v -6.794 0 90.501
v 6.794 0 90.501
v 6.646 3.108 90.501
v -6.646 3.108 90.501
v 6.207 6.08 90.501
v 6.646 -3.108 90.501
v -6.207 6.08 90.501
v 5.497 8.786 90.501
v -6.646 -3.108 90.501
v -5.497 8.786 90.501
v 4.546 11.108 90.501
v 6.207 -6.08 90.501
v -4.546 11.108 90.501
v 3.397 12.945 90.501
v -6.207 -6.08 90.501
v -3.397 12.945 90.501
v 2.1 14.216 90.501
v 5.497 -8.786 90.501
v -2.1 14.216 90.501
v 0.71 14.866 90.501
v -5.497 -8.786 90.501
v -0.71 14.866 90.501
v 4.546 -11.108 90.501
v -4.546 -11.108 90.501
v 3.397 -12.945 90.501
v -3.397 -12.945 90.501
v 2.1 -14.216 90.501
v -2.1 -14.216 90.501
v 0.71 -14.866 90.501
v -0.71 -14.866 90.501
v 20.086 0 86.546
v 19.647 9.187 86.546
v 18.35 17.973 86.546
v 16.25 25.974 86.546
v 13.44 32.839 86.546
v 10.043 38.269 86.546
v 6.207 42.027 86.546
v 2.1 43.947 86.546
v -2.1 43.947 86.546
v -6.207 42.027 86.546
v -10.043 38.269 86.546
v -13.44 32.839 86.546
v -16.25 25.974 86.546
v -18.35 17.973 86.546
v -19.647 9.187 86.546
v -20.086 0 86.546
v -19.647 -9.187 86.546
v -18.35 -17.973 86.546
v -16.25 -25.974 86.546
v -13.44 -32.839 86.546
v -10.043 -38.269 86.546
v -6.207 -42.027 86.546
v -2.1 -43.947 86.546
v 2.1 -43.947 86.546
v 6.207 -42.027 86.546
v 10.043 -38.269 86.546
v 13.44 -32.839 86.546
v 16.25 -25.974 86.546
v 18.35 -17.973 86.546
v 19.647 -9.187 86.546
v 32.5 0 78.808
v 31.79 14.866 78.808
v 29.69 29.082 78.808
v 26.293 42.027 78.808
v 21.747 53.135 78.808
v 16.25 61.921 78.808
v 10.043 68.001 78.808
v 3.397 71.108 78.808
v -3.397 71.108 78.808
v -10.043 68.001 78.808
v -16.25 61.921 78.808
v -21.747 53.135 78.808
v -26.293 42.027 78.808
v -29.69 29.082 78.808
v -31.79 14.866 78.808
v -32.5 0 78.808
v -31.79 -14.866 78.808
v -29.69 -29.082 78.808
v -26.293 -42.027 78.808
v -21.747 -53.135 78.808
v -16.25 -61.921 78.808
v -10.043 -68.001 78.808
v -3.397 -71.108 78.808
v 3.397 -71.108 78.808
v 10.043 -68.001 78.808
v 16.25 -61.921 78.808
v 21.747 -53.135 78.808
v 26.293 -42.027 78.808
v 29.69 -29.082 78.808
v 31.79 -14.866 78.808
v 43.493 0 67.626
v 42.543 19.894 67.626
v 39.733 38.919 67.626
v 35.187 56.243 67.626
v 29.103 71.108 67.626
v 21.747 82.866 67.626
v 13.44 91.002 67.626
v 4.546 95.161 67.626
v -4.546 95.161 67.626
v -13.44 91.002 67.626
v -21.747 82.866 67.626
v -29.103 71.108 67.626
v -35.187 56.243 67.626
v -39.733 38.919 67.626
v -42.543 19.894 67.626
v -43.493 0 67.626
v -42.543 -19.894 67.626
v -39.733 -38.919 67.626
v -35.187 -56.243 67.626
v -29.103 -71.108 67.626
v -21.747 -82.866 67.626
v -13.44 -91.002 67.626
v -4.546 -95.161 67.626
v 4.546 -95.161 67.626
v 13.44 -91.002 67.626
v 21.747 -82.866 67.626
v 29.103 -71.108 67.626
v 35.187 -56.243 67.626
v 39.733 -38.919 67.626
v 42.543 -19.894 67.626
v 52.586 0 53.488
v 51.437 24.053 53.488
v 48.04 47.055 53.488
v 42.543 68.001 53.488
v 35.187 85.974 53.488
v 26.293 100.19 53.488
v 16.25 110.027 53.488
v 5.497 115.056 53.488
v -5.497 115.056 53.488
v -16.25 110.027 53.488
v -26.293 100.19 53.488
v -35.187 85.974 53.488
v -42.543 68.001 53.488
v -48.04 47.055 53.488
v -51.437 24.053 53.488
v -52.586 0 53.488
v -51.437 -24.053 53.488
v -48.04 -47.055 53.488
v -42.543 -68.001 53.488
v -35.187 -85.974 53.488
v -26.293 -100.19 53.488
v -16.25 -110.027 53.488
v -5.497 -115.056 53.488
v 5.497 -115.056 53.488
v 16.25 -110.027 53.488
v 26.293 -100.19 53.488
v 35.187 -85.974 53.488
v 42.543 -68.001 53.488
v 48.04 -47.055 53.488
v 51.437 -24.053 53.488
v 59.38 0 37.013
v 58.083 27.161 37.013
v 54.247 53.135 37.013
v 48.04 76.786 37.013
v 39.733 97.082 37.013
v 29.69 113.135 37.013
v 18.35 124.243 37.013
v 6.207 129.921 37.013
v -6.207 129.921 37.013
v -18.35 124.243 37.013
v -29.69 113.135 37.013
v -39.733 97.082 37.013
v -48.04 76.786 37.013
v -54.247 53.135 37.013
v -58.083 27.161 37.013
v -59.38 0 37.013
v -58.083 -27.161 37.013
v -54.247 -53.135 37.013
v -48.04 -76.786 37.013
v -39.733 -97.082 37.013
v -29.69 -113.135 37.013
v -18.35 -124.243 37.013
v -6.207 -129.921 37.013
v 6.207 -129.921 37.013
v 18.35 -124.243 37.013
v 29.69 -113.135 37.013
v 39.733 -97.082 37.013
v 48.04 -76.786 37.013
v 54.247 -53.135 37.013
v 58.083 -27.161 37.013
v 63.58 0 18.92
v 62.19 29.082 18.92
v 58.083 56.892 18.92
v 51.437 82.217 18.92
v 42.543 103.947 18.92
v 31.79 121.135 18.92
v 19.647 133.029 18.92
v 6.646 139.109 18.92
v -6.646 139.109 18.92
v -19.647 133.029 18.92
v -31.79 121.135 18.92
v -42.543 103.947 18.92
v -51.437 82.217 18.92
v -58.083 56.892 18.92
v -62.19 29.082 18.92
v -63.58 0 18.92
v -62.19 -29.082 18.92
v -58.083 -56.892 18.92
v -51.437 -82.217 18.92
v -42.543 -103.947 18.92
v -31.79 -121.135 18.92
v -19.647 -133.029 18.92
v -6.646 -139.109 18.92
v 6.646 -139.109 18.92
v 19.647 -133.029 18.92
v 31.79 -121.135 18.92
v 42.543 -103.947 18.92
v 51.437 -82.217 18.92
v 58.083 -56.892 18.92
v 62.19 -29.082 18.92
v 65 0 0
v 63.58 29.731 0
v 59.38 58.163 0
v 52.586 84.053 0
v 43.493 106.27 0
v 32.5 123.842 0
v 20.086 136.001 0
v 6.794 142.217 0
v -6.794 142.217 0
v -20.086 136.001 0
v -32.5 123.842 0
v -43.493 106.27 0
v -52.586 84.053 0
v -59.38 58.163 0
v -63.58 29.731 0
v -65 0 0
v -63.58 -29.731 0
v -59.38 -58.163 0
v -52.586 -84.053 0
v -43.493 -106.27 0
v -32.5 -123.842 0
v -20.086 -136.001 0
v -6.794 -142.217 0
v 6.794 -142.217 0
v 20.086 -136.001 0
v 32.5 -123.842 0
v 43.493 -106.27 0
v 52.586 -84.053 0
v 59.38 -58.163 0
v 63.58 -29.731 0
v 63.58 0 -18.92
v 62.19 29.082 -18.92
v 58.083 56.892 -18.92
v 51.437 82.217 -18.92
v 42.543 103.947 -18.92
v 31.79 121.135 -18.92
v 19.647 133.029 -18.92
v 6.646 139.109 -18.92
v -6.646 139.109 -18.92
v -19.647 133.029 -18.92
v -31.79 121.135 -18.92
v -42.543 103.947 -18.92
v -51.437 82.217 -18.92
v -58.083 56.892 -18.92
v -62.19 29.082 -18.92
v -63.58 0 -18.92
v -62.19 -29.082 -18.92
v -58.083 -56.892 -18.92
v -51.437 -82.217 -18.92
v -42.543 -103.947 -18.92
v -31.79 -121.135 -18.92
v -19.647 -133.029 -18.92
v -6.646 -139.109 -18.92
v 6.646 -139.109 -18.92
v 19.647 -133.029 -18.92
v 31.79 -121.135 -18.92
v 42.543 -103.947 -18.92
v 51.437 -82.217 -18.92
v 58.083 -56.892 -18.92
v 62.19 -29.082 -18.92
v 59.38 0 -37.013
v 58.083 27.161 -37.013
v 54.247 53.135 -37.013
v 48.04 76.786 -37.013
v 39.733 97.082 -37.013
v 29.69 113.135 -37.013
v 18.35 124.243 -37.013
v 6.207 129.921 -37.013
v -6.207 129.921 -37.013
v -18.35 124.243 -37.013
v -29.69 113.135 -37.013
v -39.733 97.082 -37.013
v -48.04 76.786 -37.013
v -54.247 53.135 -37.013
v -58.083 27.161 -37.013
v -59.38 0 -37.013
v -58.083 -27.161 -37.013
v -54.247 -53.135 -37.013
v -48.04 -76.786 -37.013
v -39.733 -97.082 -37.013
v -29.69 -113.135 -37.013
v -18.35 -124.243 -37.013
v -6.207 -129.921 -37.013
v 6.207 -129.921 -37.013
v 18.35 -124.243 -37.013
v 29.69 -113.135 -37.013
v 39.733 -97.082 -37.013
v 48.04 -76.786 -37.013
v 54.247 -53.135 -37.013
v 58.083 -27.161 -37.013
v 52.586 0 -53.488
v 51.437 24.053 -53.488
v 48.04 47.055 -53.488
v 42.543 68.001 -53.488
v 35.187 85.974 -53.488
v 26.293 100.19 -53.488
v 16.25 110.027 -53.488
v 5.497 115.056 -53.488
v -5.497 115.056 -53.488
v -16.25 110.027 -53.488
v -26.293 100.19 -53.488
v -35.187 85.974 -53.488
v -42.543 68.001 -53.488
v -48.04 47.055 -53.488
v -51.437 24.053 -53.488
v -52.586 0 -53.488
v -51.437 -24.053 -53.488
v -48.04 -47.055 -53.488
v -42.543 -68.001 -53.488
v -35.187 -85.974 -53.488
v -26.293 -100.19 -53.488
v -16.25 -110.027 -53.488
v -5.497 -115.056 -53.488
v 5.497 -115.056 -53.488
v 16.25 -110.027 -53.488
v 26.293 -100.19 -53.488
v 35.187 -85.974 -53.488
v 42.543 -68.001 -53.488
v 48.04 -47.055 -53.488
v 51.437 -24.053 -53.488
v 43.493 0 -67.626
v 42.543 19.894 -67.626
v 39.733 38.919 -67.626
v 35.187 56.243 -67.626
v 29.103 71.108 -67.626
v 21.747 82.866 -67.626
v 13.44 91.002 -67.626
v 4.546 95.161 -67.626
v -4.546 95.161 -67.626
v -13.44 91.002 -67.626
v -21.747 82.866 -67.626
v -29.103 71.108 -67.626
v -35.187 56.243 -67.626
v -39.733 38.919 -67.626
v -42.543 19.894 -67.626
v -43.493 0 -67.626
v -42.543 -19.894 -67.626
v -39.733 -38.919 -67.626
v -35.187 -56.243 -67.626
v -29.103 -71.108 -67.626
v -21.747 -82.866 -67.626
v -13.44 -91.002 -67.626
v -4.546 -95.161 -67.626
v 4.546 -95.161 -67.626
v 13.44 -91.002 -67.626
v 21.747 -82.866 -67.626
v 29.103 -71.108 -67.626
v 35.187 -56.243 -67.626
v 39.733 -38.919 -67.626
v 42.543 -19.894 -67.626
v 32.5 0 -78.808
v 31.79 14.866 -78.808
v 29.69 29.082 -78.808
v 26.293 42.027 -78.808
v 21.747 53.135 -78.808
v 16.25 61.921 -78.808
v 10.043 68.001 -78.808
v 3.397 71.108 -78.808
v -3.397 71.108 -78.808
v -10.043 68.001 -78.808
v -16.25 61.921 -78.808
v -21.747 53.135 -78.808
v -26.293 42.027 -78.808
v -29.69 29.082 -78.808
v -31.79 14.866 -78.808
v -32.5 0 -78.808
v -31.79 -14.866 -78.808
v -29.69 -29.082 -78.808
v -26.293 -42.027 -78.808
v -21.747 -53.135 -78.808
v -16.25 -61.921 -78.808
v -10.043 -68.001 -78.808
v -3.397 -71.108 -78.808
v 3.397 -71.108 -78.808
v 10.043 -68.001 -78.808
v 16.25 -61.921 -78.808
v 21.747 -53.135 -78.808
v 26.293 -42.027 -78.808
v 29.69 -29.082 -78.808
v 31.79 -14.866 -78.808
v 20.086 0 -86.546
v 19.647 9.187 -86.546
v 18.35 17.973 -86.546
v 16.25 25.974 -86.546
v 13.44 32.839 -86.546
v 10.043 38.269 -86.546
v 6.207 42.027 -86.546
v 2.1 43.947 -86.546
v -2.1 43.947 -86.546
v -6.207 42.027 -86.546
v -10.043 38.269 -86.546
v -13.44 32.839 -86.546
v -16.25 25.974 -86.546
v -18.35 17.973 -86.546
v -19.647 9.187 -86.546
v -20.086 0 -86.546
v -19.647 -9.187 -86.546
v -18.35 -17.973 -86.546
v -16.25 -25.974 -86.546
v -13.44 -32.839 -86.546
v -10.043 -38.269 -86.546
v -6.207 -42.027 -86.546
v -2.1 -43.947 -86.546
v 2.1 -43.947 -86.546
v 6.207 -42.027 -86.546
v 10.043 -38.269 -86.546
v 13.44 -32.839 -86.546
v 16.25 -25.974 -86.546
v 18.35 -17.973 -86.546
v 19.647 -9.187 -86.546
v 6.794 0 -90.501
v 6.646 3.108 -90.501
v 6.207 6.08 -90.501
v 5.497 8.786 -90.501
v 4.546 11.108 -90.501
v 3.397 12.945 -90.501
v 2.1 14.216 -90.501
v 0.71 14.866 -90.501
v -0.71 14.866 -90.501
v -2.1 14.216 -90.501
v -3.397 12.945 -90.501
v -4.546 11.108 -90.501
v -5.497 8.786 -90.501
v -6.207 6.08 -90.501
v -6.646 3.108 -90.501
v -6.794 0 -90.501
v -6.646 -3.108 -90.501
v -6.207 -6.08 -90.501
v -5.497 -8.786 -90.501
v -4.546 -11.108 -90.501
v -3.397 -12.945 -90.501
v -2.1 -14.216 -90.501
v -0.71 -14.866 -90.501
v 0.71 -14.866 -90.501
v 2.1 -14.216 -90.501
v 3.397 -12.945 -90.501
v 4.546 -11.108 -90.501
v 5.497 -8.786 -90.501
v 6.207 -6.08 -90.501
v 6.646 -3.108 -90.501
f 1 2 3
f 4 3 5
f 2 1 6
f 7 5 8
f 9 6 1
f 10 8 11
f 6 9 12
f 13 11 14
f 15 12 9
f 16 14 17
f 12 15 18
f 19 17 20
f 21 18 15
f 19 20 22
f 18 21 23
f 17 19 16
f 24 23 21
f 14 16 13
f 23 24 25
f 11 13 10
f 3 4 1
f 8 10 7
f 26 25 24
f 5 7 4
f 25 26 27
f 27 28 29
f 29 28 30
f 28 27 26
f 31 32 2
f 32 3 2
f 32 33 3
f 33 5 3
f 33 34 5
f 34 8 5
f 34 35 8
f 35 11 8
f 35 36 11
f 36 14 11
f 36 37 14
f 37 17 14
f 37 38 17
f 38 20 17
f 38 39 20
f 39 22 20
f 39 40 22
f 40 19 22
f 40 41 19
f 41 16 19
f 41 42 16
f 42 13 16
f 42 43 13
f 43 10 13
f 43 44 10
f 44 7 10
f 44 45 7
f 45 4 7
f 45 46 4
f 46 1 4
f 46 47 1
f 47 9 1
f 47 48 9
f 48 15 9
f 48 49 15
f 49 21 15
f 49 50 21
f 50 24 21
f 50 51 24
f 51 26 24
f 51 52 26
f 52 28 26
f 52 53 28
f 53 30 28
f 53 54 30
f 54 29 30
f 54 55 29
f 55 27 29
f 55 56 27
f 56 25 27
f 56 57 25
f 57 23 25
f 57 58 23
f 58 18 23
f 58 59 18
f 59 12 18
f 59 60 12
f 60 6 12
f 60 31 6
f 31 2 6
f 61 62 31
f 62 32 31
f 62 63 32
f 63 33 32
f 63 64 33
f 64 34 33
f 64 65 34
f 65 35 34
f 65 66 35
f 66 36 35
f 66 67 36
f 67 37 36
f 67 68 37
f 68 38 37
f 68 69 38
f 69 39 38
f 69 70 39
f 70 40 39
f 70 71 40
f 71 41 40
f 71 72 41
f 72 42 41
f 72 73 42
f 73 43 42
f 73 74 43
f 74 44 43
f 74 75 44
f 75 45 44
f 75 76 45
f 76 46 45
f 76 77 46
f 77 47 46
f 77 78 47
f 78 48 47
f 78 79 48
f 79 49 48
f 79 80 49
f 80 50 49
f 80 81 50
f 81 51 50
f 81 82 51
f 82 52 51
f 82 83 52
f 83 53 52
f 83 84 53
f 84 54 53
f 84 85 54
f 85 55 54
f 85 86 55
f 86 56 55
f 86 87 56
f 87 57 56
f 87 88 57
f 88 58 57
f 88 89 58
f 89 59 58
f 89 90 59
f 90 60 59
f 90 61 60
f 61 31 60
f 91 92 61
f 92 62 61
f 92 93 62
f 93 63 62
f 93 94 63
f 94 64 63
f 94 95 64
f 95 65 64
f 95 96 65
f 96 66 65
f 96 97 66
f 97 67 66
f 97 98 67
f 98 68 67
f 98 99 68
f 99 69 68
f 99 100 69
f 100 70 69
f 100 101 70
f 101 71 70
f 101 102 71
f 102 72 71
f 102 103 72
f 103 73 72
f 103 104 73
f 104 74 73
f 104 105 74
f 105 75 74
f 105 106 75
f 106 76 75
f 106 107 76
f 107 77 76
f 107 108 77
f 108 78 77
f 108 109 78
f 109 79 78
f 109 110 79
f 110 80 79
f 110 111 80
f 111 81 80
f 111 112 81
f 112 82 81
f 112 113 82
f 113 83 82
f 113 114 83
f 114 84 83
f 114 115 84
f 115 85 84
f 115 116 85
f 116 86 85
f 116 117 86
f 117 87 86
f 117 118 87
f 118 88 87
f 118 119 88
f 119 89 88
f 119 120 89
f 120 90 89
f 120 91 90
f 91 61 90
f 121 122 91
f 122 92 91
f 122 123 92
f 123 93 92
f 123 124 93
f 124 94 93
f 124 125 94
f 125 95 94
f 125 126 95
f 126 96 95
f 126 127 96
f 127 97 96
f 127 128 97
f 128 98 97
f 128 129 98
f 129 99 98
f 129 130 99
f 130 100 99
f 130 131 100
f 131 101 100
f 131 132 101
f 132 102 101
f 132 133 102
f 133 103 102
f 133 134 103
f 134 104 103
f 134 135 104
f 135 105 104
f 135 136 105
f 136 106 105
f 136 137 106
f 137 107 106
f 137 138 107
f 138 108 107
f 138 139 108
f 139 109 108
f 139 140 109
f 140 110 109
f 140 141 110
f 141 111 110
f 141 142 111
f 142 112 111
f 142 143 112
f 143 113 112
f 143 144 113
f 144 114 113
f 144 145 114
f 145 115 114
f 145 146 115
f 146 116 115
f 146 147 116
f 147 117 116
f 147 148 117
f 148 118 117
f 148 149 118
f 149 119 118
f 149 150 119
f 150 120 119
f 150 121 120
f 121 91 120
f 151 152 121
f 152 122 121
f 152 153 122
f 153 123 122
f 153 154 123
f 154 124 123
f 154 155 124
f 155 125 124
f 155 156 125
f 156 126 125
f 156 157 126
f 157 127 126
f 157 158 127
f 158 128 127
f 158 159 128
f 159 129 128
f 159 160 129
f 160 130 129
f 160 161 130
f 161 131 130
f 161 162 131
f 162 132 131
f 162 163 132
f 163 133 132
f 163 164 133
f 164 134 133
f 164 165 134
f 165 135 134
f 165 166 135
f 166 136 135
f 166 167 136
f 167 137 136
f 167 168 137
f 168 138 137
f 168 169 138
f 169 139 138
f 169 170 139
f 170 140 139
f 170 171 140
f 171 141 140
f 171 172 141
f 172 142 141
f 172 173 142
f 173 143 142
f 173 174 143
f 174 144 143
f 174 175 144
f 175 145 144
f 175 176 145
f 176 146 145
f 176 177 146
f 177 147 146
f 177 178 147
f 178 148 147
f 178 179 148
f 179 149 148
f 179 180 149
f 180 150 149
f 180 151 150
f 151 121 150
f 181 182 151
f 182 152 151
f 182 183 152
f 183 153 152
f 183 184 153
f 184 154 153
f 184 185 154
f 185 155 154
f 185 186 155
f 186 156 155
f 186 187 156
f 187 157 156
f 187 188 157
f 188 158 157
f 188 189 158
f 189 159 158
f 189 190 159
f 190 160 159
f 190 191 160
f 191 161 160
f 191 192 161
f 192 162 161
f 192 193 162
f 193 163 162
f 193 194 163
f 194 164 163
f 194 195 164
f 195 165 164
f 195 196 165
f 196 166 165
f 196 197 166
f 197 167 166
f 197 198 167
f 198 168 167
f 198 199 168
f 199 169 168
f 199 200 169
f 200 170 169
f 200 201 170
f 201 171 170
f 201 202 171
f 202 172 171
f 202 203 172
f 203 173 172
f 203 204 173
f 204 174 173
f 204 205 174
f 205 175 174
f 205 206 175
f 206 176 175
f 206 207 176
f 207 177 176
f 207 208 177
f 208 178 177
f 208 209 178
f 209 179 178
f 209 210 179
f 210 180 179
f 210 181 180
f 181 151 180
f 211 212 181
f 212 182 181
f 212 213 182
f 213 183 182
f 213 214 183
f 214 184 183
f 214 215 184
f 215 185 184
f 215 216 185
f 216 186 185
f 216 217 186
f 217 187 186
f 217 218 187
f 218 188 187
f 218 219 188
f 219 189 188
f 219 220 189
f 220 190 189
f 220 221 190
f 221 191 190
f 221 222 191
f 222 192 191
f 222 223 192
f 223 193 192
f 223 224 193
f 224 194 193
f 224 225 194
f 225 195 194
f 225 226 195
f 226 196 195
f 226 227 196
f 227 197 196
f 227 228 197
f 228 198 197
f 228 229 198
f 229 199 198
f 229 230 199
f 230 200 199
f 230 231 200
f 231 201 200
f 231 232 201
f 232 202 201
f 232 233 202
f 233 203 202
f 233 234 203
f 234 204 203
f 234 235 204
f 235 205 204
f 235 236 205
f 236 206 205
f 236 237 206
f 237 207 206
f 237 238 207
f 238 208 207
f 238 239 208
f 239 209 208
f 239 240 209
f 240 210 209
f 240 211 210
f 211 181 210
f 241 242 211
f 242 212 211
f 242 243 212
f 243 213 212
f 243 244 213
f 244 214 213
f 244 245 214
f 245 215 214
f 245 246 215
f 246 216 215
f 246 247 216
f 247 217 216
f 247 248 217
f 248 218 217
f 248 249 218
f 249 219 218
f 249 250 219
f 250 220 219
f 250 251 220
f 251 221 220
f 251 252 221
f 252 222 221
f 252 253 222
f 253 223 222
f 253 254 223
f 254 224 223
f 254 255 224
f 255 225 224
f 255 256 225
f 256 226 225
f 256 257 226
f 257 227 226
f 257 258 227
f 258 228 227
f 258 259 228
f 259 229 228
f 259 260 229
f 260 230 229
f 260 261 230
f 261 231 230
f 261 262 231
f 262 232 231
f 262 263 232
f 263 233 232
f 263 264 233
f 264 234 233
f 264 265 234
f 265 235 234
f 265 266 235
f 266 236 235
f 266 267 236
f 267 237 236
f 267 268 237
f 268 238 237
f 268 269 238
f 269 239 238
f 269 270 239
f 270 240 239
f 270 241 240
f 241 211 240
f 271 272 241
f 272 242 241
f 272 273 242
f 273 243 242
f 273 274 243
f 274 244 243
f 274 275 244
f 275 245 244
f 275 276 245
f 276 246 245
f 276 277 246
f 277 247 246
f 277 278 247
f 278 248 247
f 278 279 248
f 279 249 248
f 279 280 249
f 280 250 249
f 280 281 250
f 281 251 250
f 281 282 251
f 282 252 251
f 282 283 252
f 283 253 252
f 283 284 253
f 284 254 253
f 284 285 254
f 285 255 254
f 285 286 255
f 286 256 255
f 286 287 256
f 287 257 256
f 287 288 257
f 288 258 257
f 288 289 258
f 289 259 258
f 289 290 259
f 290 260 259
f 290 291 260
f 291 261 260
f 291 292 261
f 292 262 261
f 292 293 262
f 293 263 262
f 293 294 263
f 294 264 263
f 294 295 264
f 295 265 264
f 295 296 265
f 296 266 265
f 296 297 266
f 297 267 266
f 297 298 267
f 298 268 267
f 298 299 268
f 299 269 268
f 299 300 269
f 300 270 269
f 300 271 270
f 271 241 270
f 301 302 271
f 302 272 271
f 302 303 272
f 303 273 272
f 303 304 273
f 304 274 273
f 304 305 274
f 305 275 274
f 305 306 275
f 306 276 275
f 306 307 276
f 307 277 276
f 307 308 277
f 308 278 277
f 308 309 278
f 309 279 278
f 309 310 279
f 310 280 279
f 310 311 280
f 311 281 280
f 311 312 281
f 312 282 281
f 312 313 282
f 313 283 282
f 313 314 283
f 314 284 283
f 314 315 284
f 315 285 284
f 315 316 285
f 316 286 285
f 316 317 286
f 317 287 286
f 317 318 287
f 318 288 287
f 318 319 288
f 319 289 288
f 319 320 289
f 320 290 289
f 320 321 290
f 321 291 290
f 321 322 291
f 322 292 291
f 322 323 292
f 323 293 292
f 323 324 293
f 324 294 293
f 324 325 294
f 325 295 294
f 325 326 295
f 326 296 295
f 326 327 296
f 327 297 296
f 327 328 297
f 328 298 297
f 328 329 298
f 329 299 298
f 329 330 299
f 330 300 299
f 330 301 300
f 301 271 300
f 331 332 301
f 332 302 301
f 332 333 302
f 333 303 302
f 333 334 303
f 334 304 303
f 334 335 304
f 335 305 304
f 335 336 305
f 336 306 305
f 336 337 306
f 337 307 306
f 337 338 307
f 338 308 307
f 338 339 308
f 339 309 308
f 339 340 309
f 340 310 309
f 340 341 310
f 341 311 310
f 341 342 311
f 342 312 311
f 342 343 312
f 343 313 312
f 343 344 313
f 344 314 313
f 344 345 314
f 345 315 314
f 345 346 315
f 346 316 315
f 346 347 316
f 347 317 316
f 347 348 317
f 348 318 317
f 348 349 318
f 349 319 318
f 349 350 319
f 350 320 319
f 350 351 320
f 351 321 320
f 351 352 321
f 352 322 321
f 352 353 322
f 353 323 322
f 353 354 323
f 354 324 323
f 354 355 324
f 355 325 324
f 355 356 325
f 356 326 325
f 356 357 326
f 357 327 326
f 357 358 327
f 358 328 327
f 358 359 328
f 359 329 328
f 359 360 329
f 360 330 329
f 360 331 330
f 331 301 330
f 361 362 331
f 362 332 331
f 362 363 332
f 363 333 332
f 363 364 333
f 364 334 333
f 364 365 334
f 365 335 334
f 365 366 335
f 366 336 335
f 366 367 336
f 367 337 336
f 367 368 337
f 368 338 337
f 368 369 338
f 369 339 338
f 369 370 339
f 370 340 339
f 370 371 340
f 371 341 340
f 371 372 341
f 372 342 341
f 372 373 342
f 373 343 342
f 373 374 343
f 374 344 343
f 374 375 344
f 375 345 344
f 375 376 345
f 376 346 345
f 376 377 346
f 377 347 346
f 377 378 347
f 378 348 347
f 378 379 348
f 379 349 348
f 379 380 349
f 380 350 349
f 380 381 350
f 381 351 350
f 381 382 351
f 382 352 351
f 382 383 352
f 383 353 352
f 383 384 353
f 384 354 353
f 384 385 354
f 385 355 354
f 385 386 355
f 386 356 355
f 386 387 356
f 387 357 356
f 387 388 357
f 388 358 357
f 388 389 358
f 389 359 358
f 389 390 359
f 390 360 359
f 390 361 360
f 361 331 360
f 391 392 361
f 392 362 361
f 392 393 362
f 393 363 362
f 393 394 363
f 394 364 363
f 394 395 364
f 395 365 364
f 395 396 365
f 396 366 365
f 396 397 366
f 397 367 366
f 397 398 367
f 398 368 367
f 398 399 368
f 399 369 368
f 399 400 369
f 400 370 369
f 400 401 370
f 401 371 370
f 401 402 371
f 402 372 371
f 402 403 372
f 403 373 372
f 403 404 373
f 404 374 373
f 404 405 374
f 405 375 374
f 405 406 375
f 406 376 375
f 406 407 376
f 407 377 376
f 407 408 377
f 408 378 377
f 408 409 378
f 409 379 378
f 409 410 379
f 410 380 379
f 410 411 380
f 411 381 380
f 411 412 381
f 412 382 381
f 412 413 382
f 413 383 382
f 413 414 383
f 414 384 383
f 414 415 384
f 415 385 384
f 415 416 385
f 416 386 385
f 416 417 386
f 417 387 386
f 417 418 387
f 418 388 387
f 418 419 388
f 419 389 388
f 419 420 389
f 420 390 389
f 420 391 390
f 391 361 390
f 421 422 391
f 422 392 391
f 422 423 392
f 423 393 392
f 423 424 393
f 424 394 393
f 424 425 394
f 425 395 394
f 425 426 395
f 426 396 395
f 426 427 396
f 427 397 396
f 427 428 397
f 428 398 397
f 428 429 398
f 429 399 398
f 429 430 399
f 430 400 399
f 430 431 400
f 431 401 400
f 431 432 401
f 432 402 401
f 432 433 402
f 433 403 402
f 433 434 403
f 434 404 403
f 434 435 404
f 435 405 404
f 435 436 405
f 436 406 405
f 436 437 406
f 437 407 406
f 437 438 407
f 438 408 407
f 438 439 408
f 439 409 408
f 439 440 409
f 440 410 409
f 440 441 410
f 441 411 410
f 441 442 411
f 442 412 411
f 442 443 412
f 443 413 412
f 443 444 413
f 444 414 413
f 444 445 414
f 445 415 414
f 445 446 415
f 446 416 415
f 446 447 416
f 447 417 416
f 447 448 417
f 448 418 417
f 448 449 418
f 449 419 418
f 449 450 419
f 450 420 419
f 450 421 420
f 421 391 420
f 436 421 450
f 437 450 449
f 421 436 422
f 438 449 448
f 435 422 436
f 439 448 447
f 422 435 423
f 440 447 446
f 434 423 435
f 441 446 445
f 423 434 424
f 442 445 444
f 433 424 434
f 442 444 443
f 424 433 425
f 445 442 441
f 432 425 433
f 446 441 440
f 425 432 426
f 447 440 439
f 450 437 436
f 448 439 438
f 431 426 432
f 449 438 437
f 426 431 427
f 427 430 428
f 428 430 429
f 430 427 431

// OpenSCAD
// Generated by SolidPython 1.0.1 on 2020-07-29 00:46:46


scale(v = [5, 11, 7]) {
	sphere(r = 13);
}
/***********************************************
*********      SolidPython code:      **********
************************************************
 
# import packages: SolidPython
from solid import *
from solid.utils import *
from itertools import chain, combinations, permutations


class Resize:

    def __init__(self, scad_file):
        self.scad_file = scad_file
        #self.scad_file = import_scad(scad_file)
        # cone/cylinder param:
        self.r1 = 0
        self.r2 = 0
        self.h = 0
        # rectangular prism param:
        self.w = 0
        self.l = 0
        # ellipse param:
        self.r = 0

    # import OpenScad code (file name corresponds to shape)


    # classify shape + parameters
    def assign(self, param1, param2, param3):
        if self.scad_file == 'cone.scad':
            self.r1 = param1
            self.r2 = param2
            self.h = param3
        elif self.scad_file == 'cylinder.scad':
            self.r1 = param1
            self.r2 = param2
            self.h = param3
        elif self.scad_file == 'rectangularPrism.scad':
            self.h = param1
            self.l = param2
            self.w = param3
        else:
            self.r = param1
            self.h = param2

    # resize parameters
    def iterate(self):
        x = range(3, 20, 2)
        i = 1
        if self.scad_file == 'cone.scad':
            tempList = list(permutations(x, 2))
            for temp in tempList:
                param1 = temp[0]
                param2 = temp[1]
                filepath = 'produced_scad_files/' + 'cone' + str(param1) + '_' + str(param2) + '_' + '.scad'
                scad_render_to_file(cylinder(h=param1, r1=param2, r2=0), filepath)

        elif self.scad_file == 'cylinder.scad':
            tempList = list(permutations(x, 3))
            for temp in tempList:
                param1 = temp[0]
                param2 = temp[1]
                filepath = 'produced_scad_files/' + 'cylinder' + str(param1) + '_' + str(param2) + '_' + '.scad'
                scad_render_to_file(cylinder(h=param1, r1=param2, r2=param2), filepath)

        elif self.scad_file == 'rectangularPrism.scad':
            tempList = list(permutations(x, 3))
            for temp in tempList:
                param1 = temp[0]
                param2 = temp[1]
                param3 = temp[2]
                filepath = 'produced_scad_files/' + 'rectangularPrism' + str(param1) + '_' + str(param2) + '_' + str(
                    param3) + '.scad'
                scad_render_to_file(cube(size=(param1, param2, param3)), filepath)

        elif self.scad_file == 'ellipse.scad':
            tempList = list(permutations(x, 4))
            for temp in tempList:
                param1 = temp[0]
                param2 = temp[1]
                param3 = temp[2]
                param4 = temp[3]
                filepath = 'produced_scad_files/' + 'ellipse' + str(param1) + '_' + str(param2) + '_' + str(param3) + '_' + str(param4) + '.scad'
                scad_render_to_file(scale([param1, param2, param3])(sphere(r=param4)), filepath)

    def render_to_scadfile(self):
        scad_render_to_file(scad, 'example.scad') 
 
************************************************/
